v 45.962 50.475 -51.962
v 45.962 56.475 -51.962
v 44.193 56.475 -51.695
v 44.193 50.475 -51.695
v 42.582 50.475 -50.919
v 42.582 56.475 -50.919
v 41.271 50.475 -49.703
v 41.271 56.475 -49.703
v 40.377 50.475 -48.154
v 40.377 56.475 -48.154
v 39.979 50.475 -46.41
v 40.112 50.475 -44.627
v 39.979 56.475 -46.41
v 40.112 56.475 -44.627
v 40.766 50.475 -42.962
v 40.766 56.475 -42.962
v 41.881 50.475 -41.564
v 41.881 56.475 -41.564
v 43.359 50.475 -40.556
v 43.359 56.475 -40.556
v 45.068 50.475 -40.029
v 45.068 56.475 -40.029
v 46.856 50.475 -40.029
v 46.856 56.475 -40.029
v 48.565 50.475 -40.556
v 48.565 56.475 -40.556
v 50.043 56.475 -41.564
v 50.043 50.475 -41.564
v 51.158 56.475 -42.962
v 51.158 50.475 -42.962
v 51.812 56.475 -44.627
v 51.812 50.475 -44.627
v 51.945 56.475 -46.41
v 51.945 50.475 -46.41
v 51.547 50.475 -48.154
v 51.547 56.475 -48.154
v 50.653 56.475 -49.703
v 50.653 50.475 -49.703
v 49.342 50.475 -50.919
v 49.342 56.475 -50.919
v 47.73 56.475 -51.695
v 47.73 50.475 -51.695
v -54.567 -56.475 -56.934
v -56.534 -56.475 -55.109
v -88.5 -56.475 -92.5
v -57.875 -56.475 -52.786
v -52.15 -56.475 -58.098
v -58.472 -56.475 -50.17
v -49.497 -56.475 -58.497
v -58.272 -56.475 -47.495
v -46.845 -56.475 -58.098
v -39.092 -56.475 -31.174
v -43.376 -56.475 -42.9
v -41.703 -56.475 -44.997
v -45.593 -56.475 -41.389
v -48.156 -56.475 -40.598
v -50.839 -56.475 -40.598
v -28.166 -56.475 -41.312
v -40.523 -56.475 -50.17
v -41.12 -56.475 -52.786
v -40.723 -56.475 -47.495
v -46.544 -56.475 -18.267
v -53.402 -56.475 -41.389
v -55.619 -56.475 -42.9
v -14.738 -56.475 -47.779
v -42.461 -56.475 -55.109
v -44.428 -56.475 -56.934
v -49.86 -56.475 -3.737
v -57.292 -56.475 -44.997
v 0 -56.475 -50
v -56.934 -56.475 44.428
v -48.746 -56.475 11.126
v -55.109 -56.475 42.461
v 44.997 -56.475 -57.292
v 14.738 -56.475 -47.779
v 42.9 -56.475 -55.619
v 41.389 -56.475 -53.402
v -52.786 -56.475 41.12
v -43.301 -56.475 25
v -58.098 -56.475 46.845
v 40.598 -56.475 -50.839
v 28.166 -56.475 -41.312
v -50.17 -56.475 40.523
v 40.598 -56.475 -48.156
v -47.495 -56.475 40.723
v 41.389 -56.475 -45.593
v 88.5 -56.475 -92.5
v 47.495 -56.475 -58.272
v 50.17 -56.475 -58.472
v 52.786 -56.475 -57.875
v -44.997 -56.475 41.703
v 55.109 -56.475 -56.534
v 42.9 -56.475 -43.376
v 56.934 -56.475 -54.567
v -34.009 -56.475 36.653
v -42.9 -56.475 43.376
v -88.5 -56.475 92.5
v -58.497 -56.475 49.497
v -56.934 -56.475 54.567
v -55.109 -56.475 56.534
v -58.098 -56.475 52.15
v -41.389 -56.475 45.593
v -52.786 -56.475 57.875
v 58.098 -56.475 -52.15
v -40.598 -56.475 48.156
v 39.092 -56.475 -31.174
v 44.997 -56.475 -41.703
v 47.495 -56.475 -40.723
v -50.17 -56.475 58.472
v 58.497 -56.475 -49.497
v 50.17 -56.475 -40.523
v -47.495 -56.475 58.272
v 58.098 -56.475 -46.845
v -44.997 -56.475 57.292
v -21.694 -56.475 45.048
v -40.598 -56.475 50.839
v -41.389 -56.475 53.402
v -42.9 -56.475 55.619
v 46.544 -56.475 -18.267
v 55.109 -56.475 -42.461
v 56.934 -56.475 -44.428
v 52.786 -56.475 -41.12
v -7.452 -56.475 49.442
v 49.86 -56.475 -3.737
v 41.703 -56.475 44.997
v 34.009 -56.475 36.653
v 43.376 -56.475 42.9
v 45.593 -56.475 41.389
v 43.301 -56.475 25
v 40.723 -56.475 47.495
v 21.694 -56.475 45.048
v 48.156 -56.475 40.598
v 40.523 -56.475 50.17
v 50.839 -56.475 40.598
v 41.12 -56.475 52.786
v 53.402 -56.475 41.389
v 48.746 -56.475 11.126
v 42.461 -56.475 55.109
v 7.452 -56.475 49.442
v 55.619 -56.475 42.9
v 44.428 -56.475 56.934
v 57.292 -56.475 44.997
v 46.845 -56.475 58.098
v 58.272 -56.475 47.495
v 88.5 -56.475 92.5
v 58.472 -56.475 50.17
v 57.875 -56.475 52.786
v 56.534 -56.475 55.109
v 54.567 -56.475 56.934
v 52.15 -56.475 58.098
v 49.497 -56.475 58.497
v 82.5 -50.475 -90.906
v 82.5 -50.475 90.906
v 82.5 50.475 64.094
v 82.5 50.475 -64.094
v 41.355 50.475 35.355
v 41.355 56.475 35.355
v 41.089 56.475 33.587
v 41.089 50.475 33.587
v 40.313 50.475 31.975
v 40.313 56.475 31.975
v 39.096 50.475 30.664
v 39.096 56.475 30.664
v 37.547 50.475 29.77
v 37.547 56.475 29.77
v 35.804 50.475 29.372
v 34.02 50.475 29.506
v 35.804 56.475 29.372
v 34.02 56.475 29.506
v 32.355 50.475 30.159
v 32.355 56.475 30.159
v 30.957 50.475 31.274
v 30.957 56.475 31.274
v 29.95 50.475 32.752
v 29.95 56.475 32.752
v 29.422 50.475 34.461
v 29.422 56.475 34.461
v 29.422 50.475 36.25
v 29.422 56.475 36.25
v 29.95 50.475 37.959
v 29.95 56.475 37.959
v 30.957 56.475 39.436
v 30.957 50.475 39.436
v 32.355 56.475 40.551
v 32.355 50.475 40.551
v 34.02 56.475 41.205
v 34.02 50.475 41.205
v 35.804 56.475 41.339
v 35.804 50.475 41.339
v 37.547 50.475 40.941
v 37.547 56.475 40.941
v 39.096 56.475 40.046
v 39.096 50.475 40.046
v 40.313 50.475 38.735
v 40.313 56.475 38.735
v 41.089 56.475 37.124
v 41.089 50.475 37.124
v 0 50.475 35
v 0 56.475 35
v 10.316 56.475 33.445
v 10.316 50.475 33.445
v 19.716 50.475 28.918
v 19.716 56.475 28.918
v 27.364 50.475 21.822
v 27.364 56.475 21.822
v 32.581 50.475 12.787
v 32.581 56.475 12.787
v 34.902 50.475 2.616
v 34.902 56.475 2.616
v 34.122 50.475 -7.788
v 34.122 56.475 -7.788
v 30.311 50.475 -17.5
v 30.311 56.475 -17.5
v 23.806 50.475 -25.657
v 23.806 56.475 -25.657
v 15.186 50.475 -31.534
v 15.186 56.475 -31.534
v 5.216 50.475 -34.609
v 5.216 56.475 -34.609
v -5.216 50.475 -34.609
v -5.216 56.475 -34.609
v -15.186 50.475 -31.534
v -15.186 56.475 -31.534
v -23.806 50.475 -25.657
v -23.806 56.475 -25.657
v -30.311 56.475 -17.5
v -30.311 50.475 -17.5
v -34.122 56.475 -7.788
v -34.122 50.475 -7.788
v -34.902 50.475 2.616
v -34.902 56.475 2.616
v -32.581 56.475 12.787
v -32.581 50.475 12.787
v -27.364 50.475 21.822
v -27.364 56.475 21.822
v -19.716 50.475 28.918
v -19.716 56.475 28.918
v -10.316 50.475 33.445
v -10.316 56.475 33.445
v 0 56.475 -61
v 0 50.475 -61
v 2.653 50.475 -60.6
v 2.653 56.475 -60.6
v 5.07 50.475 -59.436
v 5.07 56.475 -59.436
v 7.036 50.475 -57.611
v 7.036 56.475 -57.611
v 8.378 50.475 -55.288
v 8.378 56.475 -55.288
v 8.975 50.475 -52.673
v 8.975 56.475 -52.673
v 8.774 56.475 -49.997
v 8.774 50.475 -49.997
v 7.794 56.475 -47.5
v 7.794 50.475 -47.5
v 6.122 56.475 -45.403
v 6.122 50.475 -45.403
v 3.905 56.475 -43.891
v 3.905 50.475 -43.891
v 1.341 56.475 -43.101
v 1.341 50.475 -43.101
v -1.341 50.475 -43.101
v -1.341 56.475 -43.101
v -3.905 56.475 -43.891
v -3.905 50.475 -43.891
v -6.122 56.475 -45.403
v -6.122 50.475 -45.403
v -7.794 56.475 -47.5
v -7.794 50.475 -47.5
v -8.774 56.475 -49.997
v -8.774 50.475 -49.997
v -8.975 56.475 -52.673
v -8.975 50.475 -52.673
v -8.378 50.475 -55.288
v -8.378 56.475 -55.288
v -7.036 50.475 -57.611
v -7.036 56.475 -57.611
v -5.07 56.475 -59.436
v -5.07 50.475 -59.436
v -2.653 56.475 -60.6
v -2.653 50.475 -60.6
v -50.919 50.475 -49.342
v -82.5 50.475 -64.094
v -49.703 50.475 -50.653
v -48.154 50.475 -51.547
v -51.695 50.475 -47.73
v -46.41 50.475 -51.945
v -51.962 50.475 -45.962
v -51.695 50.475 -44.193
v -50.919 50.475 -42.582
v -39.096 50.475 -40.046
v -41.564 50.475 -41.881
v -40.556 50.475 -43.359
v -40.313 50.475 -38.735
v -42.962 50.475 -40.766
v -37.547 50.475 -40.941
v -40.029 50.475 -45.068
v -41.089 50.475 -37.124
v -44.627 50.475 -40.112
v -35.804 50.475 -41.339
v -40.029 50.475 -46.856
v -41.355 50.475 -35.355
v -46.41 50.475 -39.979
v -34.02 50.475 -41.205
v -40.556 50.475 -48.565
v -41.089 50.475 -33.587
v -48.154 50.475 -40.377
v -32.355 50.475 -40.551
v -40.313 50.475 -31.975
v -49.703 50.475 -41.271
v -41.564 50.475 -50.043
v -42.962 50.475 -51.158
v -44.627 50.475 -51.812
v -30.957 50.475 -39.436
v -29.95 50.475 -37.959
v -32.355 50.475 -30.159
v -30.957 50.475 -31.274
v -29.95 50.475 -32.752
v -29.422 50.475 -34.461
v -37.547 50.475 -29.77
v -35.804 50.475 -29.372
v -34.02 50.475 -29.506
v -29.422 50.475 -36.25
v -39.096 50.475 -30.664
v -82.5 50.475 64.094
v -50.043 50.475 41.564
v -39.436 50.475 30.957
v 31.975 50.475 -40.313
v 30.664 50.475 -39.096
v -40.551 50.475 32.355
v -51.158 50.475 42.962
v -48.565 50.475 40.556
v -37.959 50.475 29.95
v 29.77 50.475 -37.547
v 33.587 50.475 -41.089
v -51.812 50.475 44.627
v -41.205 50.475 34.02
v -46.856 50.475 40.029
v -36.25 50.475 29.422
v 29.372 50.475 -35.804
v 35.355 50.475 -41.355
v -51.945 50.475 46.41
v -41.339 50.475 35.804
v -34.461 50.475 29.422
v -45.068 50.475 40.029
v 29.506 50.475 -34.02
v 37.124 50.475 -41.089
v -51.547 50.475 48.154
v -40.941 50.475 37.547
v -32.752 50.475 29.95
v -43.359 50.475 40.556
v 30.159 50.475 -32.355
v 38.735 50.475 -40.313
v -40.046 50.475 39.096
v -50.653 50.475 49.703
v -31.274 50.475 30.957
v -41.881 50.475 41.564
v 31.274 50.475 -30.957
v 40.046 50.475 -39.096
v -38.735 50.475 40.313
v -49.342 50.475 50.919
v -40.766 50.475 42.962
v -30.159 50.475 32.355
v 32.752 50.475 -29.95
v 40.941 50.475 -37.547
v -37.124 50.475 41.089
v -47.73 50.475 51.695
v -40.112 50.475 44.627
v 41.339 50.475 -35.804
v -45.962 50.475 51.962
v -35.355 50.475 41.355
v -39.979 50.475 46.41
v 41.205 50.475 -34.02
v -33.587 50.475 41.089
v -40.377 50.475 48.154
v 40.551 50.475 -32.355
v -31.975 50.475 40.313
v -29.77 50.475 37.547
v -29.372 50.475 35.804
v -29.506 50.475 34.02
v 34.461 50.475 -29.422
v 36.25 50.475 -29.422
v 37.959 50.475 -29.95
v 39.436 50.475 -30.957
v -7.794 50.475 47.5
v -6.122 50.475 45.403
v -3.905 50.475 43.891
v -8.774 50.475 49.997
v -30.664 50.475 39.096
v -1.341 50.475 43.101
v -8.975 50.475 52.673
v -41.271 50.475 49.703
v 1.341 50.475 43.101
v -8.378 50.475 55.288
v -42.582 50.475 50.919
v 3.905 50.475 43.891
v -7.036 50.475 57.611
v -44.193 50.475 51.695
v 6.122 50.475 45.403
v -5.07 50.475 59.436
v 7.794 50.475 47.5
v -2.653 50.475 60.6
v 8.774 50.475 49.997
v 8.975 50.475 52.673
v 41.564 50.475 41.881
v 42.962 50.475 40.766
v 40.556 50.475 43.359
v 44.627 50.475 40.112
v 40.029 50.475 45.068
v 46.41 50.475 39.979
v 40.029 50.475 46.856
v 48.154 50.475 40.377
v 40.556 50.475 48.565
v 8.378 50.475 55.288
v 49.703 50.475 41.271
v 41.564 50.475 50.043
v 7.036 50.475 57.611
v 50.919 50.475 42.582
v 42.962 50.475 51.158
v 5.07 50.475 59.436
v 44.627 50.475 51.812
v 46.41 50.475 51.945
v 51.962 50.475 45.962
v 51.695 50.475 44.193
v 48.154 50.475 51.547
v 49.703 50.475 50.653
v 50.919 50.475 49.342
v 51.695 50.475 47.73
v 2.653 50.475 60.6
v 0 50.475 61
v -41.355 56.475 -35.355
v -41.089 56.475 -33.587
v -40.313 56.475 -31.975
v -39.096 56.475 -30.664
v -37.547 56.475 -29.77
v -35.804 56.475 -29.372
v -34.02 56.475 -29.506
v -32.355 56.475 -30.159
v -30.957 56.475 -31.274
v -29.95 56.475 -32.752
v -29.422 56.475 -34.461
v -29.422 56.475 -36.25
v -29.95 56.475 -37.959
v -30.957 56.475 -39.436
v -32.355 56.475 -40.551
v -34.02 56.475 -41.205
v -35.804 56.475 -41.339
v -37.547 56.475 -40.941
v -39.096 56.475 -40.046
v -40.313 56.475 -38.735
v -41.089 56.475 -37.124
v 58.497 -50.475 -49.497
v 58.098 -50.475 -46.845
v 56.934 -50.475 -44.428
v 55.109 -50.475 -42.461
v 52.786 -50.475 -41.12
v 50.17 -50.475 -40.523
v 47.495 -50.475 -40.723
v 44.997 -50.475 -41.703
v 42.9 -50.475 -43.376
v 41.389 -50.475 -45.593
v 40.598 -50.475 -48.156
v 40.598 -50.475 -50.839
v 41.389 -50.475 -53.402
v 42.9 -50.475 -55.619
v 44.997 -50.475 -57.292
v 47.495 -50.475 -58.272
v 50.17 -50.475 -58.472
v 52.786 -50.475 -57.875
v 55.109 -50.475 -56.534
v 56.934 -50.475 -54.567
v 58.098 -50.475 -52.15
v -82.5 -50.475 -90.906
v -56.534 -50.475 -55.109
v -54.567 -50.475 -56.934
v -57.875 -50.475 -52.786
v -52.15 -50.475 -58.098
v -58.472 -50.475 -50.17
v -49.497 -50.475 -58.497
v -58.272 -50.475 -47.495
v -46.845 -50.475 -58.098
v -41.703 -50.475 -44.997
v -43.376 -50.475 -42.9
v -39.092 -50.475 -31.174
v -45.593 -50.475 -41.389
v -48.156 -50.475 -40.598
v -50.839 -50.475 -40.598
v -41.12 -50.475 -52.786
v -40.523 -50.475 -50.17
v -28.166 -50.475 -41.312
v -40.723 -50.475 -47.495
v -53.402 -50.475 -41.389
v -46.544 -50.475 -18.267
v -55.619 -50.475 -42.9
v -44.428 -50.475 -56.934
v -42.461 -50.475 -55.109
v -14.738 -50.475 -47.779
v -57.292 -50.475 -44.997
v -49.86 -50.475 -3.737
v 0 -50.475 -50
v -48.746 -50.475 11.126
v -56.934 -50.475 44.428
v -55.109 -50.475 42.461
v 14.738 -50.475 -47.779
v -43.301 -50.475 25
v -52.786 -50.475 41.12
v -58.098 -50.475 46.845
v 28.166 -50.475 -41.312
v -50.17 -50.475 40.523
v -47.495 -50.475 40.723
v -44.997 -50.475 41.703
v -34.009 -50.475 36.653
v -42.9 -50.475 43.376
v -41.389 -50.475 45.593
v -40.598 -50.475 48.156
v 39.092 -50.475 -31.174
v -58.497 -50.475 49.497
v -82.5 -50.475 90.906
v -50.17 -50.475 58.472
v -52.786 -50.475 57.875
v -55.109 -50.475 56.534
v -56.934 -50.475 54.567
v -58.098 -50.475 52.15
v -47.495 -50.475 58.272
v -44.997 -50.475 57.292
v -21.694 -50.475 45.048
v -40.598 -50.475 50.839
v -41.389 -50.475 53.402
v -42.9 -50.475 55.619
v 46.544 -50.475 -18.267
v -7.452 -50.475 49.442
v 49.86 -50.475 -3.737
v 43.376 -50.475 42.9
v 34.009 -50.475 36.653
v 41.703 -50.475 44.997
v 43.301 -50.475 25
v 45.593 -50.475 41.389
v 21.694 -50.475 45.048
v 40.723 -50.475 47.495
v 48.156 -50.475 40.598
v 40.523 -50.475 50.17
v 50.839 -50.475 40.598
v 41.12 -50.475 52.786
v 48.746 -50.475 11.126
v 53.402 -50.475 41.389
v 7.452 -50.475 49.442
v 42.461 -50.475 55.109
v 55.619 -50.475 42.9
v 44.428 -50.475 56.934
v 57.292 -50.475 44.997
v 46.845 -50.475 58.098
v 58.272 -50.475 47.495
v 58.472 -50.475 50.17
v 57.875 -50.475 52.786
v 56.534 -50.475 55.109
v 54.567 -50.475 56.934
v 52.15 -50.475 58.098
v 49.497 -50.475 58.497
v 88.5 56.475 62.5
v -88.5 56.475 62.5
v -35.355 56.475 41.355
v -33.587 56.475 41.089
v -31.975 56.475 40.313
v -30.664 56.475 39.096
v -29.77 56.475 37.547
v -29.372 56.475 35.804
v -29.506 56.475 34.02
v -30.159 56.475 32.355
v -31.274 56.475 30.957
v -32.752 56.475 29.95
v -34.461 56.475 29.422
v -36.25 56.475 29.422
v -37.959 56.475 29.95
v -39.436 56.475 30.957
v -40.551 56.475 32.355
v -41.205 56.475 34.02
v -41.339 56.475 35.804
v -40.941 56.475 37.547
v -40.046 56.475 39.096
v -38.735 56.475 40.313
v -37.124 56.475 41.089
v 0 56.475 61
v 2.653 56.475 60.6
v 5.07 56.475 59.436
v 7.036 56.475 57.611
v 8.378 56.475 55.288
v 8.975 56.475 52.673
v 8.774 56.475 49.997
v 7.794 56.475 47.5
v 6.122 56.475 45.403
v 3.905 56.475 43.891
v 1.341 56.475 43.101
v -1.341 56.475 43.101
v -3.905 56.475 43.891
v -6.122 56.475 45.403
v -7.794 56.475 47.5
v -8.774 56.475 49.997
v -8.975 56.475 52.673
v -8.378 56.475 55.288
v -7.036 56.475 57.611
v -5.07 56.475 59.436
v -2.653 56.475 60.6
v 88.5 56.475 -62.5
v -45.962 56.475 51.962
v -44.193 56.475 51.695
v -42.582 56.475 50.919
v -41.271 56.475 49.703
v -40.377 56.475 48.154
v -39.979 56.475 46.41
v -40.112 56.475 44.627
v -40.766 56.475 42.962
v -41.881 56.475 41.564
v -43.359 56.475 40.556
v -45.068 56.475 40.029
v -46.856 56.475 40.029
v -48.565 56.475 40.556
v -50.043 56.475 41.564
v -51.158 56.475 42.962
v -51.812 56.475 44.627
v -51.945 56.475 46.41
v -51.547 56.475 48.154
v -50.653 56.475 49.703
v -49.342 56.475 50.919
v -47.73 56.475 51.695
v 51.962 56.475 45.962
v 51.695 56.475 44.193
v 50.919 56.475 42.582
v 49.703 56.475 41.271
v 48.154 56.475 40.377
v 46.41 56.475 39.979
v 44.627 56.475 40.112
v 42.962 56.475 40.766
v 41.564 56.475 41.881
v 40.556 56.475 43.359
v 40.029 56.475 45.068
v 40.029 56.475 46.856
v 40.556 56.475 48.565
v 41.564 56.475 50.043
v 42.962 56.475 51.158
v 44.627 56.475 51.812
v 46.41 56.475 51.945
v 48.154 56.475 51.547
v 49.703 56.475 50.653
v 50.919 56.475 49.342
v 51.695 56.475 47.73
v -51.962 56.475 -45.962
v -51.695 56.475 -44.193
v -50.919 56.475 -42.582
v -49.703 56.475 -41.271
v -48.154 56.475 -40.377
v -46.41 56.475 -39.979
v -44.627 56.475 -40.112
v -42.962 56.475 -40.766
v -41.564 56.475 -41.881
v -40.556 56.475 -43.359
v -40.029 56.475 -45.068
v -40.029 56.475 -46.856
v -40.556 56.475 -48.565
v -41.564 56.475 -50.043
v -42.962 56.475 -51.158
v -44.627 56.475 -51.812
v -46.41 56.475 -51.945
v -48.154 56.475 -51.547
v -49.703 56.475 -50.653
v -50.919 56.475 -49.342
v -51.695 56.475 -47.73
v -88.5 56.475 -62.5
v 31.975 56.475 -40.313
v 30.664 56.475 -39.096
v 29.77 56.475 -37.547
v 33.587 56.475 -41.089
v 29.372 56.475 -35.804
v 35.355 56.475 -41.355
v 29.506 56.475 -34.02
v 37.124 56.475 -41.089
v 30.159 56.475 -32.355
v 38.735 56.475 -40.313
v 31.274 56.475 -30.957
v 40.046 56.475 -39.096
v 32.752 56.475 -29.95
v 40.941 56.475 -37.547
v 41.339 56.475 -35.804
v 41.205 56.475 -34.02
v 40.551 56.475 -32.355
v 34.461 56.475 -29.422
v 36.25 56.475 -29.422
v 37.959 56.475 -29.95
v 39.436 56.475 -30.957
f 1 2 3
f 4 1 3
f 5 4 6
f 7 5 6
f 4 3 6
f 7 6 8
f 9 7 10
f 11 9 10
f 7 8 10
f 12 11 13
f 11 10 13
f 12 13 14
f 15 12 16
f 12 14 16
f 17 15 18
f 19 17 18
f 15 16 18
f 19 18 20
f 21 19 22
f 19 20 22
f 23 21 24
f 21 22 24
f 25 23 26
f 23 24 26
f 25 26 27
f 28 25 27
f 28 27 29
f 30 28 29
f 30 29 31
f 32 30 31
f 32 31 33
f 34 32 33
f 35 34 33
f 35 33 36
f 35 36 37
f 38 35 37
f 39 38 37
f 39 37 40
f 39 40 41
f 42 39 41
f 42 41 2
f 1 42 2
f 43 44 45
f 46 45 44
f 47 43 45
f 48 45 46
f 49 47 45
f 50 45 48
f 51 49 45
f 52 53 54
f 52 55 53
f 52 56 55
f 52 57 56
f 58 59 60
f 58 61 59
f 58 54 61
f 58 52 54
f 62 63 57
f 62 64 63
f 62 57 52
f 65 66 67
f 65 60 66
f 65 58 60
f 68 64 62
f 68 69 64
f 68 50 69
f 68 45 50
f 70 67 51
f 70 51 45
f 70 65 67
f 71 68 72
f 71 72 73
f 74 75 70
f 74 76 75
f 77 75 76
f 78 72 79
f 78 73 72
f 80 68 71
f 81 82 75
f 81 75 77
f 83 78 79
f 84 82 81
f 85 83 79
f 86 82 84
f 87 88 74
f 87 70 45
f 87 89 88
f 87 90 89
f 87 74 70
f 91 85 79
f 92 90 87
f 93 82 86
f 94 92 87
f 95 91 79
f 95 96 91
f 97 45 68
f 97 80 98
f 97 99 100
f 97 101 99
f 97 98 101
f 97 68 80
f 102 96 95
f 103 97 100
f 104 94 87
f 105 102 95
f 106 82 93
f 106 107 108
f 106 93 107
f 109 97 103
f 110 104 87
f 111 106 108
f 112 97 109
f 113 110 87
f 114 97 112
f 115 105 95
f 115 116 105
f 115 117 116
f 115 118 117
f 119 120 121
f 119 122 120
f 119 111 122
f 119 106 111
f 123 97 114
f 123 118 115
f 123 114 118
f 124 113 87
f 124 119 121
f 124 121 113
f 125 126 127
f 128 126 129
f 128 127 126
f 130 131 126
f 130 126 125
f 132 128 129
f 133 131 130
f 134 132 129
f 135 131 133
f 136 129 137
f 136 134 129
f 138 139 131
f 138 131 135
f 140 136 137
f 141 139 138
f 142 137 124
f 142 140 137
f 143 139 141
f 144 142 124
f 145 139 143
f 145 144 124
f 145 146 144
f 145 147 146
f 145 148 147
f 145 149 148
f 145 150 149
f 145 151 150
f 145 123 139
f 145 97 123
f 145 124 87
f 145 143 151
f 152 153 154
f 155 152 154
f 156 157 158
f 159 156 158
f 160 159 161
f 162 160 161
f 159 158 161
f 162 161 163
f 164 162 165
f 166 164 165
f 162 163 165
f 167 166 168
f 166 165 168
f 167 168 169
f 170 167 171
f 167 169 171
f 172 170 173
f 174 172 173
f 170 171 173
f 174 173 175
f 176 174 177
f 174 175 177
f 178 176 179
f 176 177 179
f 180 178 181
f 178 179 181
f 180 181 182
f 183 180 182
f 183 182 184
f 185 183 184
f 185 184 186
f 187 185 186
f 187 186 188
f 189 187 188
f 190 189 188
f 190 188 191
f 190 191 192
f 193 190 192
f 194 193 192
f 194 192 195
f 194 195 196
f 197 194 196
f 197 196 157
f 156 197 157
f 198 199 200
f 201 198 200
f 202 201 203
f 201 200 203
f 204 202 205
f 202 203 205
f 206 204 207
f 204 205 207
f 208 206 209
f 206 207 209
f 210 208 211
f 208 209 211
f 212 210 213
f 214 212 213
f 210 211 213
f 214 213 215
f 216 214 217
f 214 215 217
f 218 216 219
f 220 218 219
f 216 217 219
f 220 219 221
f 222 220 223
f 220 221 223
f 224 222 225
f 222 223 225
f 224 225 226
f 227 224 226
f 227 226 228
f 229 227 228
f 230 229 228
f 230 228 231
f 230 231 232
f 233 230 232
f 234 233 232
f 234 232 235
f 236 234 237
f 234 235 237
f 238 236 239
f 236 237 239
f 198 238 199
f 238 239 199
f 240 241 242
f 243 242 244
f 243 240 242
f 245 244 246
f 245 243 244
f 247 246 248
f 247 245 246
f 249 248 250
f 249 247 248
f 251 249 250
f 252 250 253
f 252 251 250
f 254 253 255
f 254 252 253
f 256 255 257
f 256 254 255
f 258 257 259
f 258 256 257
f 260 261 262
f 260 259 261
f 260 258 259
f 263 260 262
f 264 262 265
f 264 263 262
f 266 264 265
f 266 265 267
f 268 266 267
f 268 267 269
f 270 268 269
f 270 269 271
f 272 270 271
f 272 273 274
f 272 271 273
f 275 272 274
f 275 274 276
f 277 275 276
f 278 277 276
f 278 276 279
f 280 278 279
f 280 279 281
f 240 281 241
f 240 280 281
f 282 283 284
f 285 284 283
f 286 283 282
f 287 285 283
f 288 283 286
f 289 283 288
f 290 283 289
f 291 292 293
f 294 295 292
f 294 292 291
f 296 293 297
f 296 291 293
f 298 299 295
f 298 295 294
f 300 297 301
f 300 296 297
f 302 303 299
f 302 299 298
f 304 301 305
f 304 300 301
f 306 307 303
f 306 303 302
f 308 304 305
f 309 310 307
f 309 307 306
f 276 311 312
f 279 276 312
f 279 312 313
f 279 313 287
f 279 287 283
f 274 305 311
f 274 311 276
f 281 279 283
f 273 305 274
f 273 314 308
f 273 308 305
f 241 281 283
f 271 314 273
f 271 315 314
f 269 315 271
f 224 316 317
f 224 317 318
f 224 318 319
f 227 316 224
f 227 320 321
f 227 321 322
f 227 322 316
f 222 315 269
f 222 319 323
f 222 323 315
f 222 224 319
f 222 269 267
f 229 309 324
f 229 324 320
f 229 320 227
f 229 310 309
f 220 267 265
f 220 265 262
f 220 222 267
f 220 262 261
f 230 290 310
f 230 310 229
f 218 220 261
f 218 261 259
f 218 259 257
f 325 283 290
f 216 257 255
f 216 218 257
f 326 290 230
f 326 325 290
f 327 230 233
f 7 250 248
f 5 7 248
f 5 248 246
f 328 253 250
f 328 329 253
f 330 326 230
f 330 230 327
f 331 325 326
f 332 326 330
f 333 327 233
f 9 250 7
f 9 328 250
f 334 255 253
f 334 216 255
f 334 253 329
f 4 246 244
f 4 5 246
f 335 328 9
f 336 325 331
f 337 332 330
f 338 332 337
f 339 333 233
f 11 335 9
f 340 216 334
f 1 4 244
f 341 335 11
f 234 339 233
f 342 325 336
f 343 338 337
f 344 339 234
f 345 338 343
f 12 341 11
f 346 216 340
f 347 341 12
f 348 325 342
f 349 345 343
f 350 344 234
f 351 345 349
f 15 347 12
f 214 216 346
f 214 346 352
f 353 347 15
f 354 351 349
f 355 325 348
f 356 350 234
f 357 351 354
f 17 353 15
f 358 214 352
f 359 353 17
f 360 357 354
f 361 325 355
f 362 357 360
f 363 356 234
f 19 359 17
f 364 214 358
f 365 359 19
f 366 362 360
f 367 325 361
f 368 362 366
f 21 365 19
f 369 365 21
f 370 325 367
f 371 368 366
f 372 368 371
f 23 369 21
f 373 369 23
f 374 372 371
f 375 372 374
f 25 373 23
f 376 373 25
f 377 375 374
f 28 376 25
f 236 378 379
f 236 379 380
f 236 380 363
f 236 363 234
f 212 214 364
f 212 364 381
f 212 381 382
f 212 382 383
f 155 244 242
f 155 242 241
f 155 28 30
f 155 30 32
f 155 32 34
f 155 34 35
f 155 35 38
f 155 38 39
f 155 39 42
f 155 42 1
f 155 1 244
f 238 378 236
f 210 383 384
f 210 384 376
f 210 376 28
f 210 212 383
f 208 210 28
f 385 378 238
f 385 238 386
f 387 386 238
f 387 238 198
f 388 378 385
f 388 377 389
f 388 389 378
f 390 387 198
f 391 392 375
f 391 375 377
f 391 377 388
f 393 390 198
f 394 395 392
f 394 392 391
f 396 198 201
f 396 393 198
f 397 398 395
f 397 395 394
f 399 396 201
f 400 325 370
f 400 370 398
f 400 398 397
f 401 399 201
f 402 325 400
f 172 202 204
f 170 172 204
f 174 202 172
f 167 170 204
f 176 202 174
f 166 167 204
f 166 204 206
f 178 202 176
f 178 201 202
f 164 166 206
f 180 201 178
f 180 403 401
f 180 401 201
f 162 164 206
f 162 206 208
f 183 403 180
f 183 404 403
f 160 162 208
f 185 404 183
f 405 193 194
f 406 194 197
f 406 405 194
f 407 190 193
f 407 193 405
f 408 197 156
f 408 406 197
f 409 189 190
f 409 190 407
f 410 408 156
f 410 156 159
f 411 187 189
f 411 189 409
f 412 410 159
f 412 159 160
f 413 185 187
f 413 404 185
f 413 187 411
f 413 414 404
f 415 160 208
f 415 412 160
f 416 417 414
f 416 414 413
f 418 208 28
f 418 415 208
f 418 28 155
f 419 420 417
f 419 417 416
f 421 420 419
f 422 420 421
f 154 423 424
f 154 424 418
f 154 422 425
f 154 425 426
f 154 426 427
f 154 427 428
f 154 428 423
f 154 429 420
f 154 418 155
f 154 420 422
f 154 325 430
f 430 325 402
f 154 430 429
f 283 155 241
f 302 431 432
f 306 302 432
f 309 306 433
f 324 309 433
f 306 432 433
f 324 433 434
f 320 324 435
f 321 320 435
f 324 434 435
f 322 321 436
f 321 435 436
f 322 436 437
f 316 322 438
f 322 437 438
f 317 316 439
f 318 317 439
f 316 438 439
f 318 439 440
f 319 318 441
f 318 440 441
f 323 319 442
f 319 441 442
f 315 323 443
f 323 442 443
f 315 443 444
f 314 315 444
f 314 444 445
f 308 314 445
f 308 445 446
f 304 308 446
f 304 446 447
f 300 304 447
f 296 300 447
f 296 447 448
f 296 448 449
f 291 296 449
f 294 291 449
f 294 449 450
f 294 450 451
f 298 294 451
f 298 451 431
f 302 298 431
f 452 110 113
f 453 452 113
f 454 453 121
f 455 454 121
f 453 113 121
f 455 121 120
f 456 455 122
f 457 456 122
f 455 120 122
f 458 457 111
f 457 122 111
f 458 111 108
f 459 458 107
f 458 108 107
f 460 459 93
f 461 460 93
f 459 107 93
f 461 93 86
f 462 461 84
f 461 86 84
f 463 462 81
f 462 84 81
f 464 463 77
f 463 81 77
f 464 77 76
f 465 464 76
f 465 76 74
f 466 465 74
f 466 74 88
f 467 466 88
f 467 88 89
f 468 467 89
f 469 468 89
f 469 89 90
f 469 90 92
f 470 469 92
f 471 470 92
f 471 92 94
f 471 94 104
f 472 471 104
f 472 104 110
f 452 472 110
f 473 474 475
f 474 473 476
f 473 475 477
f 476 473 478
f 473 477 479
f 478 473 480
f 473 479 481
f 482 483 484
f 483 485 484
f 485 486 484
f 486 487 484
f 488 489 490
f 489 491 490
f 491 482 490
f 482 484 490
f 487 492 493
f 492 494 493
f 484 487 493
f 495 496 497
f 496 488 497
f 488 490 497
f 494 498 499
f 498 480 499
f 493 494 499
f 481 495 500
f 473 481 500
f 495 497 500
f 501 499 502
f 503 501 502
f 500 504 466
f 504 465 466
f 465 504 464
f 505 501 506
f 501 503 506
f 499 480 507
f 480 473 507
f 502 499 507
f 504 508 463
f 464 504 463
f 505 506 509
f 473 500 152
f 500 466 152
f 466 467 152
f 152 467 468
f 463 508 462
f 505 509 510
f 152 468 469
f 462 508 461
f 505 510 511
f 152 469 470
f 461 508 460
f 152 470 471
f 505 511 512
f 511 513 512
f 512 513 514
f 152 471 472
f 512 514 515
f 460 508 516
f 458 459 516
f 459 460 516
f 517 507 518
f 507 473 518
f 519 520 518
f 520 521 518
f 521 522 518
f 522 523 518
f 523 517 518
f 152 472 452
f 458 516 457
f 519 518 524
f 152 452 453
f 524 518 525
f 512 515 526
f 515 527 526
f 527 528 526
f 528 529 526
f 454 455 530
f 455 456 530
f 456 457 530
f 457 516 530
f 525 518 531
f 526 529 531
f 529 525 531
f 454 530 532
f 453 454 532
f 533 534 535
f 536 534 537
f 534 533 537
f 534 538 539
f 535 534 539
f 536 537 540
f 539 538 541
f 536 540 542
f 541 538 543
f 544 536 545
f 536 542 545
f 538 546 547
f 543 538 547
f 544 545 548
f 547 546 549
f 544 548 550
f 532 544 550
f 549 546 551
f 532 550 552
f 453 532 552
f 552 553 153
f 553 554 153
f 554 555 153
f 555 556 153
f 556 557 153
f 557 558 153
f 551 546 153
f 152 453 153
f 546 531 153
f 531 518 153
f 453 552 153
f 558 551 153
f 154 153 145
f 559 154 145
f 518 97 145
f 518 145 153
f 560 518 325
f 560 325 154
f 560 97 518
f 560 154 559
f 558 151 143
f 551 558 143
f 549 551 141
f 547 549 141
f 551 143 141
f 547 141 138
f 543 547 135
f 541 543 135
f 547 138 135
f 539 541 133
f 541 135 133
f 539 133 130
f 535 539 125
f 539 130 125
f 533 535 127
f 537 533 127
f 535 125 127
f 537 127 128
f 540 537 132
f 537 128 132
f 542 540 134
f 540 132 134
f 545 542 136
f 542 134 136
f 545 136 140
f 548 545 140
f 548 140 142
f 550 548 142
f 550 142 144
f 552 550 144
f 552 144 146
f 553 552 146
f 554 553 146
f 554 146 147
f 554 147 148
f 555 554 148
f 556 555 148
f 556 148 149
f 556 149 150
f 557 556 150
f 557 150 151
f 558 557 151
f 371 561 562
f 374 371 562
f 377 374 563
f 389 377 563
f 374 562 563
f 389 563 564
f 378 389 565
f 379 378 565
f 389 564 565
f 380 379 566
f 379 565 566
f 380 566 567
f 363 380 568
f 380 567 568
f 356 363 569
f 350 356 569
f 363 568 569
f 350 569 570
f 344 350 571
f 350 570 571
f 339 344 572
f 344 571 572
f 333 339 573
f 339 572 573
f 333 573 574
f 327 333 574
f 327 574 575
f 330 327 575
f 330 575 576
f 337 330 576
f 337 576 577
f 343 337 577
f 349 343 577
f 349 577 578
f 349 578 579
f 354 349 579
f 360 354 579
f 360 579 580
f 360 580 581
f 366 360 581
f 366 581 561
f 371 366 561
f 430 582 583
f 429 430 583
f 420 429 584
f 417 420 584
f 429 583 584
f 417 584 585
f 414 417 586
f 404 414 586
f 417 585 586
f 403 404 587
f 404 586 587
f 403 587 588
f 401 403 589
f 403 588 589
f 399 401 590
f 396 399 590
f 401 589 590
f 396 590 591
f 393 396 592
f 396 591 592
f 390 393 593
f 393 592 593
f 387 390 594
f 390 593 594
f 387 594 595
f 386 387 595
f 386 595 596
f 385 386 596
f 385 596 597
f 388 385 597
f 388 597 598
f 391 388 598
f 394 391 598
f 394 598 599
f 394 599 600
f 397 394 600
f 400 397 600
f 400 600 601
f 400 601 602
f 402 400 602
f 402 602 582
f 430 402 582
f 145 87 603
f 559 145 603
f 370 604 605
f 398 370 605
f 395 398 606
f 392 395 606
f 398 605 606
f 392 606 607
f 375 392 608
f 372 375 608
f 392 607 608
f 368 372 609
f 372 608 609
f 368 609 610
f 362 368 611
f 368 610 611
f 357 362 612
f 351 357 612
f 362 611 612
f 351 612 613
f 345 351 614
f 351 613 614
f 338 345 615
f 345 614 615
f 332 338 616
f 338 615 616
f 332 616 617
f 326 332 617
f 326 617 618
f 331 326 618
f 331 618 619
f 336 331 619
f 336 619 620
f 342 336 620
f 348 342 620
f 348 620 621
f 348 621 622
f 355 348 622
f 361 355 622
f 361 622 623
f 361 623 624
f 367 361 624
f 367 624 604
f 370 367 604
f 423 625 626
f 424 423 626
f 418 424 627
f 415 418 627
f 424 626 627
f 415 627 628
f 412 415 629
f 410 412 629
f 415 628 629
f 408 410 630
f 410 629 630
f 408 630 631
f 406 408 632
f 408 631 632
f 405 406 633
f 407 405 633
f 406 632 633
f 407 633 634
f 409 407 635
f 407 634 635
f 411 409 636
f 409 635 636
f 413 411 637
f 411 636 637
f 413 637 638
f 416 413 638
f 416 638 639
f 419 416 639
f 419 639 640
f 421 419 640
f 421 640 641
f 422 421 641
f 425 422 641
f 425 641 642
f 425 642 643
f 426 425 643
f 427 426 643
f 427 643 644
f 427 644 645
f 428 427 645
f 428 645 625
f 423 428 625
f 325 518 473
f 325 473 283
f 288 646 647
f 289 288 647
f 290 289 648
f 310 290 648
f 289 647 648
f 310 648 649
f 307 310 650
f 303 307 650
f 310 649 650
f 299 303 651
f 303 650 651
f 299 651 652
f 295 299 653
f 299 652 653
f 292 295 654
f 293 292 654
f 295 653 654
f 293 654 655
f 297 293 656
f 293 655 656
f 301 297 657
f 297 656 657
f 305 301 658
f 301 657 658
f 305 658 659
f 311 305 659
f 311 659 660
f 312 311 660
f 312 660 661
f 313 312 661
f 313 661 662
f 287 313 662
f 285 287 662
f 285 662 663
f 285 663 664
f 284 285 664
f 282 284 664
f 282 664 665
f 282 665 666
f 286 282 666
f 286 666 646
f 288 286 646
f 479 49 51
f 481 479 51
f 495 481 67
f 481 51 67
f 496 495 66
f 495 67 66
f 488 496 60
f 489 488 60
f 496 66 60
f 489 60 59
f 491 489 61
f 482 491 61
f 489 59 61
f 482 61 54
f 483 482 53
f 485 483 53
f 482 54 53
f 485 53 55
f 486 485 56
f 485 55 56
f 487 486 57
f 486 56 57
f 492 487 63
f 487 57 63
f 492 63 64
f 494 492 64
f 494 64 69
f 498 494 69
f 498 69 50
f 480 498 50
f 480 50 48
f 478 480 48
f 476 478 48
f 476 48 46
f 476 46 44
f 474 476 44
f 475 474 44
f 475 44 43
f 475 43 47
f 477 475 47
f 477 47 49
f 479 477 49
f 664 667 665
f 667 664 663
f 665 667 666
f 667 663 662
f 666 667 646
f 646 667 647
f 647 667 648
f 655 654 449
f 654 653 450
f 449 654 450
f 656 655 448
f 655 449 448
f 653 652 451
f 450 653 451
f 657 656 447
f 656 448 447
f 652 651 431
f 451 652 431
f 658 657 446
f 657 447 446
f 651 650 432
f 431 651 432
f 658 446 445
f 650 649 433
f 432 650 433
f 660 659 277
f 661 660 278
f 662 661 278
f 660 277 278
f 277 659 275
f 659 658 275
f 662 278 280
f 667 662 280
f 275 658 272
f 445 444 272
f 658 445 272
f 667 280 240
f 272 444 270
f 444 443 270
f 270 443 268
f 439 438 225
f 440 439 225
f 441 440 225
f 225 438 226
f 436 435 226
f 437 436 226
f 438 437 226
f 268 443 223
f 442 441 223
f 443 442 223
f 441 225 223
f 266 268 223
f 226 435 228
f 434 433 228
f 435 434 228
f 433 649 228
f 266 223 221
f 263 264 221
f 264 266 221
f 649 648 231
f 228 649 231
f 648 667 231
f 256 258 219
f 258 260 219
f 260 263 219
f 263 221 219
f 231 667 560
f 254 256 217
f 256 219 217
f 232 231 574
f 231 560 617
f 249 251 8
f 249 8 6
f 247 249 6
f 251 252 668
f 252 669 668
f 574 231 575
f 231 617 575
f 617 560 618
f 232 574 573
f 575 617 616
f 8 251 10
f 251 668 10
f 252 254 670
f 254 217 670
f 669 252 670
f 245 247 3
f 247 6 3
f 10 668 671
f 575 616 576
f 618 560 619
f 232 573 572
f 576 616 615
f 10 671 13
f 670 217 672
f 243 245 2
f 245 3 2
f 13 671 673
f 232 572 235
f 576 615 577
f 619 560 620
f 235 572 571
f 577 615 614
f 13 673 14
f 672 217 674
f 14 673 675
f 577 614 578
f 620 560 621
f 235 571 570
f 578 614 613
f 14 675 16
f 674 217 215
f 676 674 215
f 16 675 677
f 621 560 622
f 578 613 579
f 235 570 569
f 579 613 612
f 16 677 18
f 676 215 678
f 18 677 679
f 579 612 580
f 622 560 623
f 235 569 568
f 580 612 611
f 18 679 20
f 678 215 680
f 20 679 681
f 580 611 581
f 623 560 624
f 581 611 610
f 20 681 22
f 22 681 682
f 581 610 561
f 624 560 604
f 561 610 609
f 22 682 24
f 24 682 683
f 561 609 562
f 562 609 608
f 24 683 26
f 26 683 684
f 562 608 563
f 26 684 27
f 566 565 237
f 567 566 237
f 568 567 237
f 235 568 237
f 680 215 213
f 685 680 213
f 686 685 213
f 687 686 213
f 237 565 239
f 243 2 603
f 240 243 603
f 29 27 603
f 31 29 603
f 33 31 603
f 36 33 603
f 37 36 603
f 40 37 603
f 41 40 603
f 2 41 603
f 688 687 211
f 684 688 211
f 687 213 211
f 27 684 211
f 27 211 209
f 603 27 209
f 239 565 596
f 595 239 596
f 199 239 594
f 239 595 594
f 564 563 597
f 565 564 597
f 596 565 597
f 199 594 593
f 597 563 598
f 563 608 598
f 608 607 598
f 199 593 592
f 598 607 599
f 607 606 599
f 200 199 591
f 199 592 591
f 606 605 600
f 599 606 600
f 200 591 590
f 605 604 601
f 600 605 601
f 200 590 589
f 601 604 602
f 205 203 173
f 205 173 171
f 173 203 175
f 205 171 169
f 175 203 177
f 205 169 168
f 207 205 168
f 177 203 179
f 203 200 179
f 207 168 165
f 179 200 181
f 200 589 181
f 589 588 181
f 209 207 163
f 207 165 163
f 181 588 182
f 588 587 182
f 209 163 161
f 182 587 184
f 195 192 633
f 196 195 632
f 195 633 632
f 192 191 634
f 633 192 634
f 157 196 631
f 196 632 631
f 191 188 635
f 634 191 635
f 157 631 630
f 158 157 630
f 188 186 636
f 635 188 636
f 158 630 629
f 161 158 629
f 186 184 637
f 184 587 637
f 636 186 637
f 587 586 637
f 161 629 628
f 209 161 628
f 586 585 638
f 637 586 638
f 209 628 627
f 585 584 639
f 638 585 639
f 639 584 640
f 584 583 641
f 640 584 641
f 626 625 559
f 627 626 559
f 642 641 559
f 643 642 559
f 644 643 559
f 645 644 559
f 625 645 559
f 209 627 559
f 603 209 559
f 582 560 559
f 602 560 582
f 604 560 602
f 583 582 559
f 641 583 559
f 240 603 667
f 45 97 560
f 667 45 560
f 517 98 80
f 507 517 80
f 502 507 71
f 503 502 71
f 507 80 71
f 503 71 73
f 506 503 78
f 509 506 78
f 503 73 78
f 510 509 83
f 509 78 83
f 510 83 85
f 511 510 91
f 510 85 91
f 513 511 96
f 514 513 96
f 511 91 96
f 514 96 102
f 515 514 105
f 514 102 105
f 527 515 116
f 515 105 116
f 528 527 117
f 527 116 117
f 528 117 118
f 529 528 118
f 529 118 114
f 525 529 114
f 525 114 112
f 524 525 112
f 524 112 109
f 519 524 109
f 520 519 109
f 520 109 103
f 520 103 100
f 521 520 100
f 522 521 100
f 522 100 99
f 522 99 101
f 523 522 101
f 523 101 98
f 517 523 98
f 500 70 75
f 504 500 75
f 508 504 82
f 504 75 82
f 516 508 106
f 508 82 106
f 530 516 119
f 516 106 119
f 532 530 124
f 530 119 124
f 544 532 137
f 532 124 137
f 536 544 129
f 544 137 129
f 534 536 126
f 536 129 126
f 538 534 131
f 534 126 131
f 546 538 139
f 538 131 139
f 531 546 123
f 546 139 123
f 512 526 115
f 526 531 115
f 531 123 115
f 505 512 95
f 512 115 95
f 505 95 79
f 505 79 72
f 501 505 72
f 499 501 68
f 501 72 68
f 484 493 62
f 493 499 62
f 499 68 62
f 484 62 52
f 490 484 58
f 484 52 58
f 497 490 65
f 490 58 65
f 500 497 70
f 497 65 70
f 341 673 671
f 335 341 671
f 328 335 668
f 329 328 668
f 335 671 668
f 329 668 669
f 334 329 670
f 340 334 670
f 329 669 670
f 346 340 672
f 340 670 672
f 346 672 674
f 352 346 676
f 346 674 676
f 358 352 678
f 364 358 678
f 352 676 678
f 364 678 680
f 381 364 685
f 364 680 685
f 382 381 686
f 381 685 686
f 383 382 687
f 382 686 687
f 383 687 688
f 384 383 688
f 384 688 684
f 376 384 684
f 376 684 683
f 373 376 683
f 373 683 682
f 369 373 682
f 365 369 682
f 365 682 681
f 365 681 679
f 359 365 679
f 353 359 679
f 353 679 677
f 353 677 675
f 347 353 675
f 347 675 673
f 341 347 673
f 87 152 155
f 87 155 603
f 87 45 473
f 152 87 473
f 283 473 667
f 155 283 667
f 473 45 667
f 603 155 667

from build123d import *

# Parameters (mm, degrees)
SKETCH1_W           = 177
SKETCH1_H           = 112.94900091
SKETCH1_W_2         = 165
SKETCH1_H_2         = 100.94900091
EXTRUDE_THIN1_DEPTH = 92.5
CUT_EXTRUDE1_REACH  = 172.722
SKETCH2_R           = 35
SKETCH2_R_2         = 6
SKETCH3_R           = 50
SKETCH3_R_2         = 9
CUT_EXTRUDE2_DEPTH  = 10
CUT_EXTRUDE3_DEPTH  = 208.544258417
CIRPATTERN1_COUNT   = 4
SKETCH5_R           = 9
CUT_EXTRUDE4_DEPTH  = 10


with BuildPart() as part:
    # Sketch1 → Extrude-Thin1 (new, symmetric)
    with BuildSketch(Plane.XY):
        Rectangle(SKETCH1_W, SKETCH1_H)
        Rectangle(SKETCH1_W_2, SKETCH1_H_2, mode=Mode.SUBTRACT)
    extrude(amount=EXTRUDE_THIN1_DEPTH, both=True)

    # Sketch2 → Cut-Extrude1 (cut, up to next)
    with BuildSketch(Plane(origin=(0, 56.474500455, 0), x_dir=(1, 0, 0), z_dir=(0, 1, 0)), mode=Mode.PRIVATE) as cut_extrude1_sk1:
        with Locations(Location((0, 0, 0), (0, 0, 270))):
            Circle(SKETCH2_R)
    cut_extrude1_tool1 = extrude(cut_extrude1_sk1.sketch, amount=-CUT_EXTRUDE1_REACH, mode=Mode.PRIVATE) & part.part
    # Sketch2 → Cut-Extrude1 (cut, up to next)
    with BuildSketch(Plane(origin=(0, 56.474500455, 0), x_dir=(1, 0, 0), z_dir=(0, 1, 0)), mode=Mode.PRIVATE) as cut_extrude1_sk2:
        with Locations(Location((-35.355339059, -35.355339059, 0), (0, 0, 270))):
            Circle(SKETCH2_R_2)
    cut_extrude1_tool2 = extrude(cut_extrude1_sk2.sketch, amount=-CUT_EXTRUDE1_REACH, mode=Mode.PRIVATE) & part.part
    # Sketch2 → Cut-Extrude1 (cut, up to next)
    with BuildSketch(Plane(origin=(0, 56.474500455, 0), x_dir=(1, 0, 0), z_dir=(0, 1, 0)), mode=Mode.PRIVATE) as cut_extrude1_sk3:
        with Locations(Location((-45.961940777, -45.961940777, 0), (0, 0, 270))):
            Circle(SKETCH2_R_2)
    cut_extrude1_tool3 = extrude(cut_extrude1_sk3.sketch, amount=-CUT_EXTRUDE1_REACH, mode=Mode.PRIVATE) & part.part
    cut_extrude1_1 = cut_extrude1_tool1.solids().sort_by_distance((0, 56.4745, 0))[0]
    add(cut_extrude1_1, mode=Mode.SUBTRACT)
    cut_extrude1_2 = cut_extrude1_tool2.solids().sort_by_distance((-35.355339, 56.4745, 35.355339))[0]
    add(cut_extrude1_2, mode=Mode.SUBTRACT)
    cut_extrude1_3 = cut_extrude1_tool3.solids().sort_by_distance((-45.961941, 56.4745, 45.961941))[0]
    add(cut_extrude1_3, mode=Mode.SUBTRACT)
    cut_extrude1 = cut_extrude1_1 + cut_extrude1_2 + cut_extrude1_3  # Cut-Extrude1 as one shape, for the pattern or mirror that repeats it

    # Sketch3 → Cut-Extrude2 (cut)
    with BuildSketch(Plane.XZ.offset(56.474500455)):
        with Locations(Location((0, 0, 0), (0, 0, 270))):
            Circle(SKETCH3_R)
        with Locations(Location((-49.497474683, -49.497474683, 0), (0, 0, 270))):
            Circle(SKETCH3_R_2)
    cut_extrude2 = extrude(amount=-CUT_EXTRUDE2_DEPTH, mode=Mode.SUBTRACT)

    # Sketch4 → Cut-Extrude3 (cut, through all)
    with BuildSketch(Plane.ZY.offset(88.5)):
        Polygon((-92.5, -56.474500455), (-62.5, 56.474500455), (-92.5, 56.474500455), align=None)
    cut_extrude3 = extrude(amount=-CUT_EXTRUDE3_DEPTH, mode=Mode.SUBTRACT)

    # Mirror1: Cut-Extrude3 across plane
    add(cut_extrude3.mirror(Plane.XY), mode=Mode.SUBTRACT)

    # CirPattern1: Cut-Extrude1, Cut-Extrude2 ×4 about axis
    cirpattern1_axis = Axis((0, 0, 0), (0, 1, 0))
    add([cut_extrude1.rotate(cirpattern1_axis, i * 360 / CIRPATTERN1_COUNT) for i in range(1, CIRPATTERN1_COUNT)], mode=Mode.SUBTRACT)
    add([cut_extrude2.rotate(cirpattern1_axis, i * 360 / CIRPATTERN1_COUNT) for i in range(1, CIRPATTERN1_COUNT)], mode=Mode.SUBTRACT)

    # Sketch5 → Cut-Extrude4 (cut)
    with BuildSketch(Plane(origin=(0, 56.474500455, 0), x_dir=(1, 0, 0), z_dir=(0, 1, 0))):
        with Locations(Location((0, -52, 0), (0, 0, 270))):
            Circle(SKETCH5_R)
    cut_extrude4 = extrude(amount=-CUT_EXTRUDE4_DEPTH, mode=Mode.SUBTRACT)

    # Mirror2: Cut-Extrude4 across plane
    add(cut_extrude4.mirror(Plane.XY), mode=Mode.SUBTRACT)


solid = part.part
